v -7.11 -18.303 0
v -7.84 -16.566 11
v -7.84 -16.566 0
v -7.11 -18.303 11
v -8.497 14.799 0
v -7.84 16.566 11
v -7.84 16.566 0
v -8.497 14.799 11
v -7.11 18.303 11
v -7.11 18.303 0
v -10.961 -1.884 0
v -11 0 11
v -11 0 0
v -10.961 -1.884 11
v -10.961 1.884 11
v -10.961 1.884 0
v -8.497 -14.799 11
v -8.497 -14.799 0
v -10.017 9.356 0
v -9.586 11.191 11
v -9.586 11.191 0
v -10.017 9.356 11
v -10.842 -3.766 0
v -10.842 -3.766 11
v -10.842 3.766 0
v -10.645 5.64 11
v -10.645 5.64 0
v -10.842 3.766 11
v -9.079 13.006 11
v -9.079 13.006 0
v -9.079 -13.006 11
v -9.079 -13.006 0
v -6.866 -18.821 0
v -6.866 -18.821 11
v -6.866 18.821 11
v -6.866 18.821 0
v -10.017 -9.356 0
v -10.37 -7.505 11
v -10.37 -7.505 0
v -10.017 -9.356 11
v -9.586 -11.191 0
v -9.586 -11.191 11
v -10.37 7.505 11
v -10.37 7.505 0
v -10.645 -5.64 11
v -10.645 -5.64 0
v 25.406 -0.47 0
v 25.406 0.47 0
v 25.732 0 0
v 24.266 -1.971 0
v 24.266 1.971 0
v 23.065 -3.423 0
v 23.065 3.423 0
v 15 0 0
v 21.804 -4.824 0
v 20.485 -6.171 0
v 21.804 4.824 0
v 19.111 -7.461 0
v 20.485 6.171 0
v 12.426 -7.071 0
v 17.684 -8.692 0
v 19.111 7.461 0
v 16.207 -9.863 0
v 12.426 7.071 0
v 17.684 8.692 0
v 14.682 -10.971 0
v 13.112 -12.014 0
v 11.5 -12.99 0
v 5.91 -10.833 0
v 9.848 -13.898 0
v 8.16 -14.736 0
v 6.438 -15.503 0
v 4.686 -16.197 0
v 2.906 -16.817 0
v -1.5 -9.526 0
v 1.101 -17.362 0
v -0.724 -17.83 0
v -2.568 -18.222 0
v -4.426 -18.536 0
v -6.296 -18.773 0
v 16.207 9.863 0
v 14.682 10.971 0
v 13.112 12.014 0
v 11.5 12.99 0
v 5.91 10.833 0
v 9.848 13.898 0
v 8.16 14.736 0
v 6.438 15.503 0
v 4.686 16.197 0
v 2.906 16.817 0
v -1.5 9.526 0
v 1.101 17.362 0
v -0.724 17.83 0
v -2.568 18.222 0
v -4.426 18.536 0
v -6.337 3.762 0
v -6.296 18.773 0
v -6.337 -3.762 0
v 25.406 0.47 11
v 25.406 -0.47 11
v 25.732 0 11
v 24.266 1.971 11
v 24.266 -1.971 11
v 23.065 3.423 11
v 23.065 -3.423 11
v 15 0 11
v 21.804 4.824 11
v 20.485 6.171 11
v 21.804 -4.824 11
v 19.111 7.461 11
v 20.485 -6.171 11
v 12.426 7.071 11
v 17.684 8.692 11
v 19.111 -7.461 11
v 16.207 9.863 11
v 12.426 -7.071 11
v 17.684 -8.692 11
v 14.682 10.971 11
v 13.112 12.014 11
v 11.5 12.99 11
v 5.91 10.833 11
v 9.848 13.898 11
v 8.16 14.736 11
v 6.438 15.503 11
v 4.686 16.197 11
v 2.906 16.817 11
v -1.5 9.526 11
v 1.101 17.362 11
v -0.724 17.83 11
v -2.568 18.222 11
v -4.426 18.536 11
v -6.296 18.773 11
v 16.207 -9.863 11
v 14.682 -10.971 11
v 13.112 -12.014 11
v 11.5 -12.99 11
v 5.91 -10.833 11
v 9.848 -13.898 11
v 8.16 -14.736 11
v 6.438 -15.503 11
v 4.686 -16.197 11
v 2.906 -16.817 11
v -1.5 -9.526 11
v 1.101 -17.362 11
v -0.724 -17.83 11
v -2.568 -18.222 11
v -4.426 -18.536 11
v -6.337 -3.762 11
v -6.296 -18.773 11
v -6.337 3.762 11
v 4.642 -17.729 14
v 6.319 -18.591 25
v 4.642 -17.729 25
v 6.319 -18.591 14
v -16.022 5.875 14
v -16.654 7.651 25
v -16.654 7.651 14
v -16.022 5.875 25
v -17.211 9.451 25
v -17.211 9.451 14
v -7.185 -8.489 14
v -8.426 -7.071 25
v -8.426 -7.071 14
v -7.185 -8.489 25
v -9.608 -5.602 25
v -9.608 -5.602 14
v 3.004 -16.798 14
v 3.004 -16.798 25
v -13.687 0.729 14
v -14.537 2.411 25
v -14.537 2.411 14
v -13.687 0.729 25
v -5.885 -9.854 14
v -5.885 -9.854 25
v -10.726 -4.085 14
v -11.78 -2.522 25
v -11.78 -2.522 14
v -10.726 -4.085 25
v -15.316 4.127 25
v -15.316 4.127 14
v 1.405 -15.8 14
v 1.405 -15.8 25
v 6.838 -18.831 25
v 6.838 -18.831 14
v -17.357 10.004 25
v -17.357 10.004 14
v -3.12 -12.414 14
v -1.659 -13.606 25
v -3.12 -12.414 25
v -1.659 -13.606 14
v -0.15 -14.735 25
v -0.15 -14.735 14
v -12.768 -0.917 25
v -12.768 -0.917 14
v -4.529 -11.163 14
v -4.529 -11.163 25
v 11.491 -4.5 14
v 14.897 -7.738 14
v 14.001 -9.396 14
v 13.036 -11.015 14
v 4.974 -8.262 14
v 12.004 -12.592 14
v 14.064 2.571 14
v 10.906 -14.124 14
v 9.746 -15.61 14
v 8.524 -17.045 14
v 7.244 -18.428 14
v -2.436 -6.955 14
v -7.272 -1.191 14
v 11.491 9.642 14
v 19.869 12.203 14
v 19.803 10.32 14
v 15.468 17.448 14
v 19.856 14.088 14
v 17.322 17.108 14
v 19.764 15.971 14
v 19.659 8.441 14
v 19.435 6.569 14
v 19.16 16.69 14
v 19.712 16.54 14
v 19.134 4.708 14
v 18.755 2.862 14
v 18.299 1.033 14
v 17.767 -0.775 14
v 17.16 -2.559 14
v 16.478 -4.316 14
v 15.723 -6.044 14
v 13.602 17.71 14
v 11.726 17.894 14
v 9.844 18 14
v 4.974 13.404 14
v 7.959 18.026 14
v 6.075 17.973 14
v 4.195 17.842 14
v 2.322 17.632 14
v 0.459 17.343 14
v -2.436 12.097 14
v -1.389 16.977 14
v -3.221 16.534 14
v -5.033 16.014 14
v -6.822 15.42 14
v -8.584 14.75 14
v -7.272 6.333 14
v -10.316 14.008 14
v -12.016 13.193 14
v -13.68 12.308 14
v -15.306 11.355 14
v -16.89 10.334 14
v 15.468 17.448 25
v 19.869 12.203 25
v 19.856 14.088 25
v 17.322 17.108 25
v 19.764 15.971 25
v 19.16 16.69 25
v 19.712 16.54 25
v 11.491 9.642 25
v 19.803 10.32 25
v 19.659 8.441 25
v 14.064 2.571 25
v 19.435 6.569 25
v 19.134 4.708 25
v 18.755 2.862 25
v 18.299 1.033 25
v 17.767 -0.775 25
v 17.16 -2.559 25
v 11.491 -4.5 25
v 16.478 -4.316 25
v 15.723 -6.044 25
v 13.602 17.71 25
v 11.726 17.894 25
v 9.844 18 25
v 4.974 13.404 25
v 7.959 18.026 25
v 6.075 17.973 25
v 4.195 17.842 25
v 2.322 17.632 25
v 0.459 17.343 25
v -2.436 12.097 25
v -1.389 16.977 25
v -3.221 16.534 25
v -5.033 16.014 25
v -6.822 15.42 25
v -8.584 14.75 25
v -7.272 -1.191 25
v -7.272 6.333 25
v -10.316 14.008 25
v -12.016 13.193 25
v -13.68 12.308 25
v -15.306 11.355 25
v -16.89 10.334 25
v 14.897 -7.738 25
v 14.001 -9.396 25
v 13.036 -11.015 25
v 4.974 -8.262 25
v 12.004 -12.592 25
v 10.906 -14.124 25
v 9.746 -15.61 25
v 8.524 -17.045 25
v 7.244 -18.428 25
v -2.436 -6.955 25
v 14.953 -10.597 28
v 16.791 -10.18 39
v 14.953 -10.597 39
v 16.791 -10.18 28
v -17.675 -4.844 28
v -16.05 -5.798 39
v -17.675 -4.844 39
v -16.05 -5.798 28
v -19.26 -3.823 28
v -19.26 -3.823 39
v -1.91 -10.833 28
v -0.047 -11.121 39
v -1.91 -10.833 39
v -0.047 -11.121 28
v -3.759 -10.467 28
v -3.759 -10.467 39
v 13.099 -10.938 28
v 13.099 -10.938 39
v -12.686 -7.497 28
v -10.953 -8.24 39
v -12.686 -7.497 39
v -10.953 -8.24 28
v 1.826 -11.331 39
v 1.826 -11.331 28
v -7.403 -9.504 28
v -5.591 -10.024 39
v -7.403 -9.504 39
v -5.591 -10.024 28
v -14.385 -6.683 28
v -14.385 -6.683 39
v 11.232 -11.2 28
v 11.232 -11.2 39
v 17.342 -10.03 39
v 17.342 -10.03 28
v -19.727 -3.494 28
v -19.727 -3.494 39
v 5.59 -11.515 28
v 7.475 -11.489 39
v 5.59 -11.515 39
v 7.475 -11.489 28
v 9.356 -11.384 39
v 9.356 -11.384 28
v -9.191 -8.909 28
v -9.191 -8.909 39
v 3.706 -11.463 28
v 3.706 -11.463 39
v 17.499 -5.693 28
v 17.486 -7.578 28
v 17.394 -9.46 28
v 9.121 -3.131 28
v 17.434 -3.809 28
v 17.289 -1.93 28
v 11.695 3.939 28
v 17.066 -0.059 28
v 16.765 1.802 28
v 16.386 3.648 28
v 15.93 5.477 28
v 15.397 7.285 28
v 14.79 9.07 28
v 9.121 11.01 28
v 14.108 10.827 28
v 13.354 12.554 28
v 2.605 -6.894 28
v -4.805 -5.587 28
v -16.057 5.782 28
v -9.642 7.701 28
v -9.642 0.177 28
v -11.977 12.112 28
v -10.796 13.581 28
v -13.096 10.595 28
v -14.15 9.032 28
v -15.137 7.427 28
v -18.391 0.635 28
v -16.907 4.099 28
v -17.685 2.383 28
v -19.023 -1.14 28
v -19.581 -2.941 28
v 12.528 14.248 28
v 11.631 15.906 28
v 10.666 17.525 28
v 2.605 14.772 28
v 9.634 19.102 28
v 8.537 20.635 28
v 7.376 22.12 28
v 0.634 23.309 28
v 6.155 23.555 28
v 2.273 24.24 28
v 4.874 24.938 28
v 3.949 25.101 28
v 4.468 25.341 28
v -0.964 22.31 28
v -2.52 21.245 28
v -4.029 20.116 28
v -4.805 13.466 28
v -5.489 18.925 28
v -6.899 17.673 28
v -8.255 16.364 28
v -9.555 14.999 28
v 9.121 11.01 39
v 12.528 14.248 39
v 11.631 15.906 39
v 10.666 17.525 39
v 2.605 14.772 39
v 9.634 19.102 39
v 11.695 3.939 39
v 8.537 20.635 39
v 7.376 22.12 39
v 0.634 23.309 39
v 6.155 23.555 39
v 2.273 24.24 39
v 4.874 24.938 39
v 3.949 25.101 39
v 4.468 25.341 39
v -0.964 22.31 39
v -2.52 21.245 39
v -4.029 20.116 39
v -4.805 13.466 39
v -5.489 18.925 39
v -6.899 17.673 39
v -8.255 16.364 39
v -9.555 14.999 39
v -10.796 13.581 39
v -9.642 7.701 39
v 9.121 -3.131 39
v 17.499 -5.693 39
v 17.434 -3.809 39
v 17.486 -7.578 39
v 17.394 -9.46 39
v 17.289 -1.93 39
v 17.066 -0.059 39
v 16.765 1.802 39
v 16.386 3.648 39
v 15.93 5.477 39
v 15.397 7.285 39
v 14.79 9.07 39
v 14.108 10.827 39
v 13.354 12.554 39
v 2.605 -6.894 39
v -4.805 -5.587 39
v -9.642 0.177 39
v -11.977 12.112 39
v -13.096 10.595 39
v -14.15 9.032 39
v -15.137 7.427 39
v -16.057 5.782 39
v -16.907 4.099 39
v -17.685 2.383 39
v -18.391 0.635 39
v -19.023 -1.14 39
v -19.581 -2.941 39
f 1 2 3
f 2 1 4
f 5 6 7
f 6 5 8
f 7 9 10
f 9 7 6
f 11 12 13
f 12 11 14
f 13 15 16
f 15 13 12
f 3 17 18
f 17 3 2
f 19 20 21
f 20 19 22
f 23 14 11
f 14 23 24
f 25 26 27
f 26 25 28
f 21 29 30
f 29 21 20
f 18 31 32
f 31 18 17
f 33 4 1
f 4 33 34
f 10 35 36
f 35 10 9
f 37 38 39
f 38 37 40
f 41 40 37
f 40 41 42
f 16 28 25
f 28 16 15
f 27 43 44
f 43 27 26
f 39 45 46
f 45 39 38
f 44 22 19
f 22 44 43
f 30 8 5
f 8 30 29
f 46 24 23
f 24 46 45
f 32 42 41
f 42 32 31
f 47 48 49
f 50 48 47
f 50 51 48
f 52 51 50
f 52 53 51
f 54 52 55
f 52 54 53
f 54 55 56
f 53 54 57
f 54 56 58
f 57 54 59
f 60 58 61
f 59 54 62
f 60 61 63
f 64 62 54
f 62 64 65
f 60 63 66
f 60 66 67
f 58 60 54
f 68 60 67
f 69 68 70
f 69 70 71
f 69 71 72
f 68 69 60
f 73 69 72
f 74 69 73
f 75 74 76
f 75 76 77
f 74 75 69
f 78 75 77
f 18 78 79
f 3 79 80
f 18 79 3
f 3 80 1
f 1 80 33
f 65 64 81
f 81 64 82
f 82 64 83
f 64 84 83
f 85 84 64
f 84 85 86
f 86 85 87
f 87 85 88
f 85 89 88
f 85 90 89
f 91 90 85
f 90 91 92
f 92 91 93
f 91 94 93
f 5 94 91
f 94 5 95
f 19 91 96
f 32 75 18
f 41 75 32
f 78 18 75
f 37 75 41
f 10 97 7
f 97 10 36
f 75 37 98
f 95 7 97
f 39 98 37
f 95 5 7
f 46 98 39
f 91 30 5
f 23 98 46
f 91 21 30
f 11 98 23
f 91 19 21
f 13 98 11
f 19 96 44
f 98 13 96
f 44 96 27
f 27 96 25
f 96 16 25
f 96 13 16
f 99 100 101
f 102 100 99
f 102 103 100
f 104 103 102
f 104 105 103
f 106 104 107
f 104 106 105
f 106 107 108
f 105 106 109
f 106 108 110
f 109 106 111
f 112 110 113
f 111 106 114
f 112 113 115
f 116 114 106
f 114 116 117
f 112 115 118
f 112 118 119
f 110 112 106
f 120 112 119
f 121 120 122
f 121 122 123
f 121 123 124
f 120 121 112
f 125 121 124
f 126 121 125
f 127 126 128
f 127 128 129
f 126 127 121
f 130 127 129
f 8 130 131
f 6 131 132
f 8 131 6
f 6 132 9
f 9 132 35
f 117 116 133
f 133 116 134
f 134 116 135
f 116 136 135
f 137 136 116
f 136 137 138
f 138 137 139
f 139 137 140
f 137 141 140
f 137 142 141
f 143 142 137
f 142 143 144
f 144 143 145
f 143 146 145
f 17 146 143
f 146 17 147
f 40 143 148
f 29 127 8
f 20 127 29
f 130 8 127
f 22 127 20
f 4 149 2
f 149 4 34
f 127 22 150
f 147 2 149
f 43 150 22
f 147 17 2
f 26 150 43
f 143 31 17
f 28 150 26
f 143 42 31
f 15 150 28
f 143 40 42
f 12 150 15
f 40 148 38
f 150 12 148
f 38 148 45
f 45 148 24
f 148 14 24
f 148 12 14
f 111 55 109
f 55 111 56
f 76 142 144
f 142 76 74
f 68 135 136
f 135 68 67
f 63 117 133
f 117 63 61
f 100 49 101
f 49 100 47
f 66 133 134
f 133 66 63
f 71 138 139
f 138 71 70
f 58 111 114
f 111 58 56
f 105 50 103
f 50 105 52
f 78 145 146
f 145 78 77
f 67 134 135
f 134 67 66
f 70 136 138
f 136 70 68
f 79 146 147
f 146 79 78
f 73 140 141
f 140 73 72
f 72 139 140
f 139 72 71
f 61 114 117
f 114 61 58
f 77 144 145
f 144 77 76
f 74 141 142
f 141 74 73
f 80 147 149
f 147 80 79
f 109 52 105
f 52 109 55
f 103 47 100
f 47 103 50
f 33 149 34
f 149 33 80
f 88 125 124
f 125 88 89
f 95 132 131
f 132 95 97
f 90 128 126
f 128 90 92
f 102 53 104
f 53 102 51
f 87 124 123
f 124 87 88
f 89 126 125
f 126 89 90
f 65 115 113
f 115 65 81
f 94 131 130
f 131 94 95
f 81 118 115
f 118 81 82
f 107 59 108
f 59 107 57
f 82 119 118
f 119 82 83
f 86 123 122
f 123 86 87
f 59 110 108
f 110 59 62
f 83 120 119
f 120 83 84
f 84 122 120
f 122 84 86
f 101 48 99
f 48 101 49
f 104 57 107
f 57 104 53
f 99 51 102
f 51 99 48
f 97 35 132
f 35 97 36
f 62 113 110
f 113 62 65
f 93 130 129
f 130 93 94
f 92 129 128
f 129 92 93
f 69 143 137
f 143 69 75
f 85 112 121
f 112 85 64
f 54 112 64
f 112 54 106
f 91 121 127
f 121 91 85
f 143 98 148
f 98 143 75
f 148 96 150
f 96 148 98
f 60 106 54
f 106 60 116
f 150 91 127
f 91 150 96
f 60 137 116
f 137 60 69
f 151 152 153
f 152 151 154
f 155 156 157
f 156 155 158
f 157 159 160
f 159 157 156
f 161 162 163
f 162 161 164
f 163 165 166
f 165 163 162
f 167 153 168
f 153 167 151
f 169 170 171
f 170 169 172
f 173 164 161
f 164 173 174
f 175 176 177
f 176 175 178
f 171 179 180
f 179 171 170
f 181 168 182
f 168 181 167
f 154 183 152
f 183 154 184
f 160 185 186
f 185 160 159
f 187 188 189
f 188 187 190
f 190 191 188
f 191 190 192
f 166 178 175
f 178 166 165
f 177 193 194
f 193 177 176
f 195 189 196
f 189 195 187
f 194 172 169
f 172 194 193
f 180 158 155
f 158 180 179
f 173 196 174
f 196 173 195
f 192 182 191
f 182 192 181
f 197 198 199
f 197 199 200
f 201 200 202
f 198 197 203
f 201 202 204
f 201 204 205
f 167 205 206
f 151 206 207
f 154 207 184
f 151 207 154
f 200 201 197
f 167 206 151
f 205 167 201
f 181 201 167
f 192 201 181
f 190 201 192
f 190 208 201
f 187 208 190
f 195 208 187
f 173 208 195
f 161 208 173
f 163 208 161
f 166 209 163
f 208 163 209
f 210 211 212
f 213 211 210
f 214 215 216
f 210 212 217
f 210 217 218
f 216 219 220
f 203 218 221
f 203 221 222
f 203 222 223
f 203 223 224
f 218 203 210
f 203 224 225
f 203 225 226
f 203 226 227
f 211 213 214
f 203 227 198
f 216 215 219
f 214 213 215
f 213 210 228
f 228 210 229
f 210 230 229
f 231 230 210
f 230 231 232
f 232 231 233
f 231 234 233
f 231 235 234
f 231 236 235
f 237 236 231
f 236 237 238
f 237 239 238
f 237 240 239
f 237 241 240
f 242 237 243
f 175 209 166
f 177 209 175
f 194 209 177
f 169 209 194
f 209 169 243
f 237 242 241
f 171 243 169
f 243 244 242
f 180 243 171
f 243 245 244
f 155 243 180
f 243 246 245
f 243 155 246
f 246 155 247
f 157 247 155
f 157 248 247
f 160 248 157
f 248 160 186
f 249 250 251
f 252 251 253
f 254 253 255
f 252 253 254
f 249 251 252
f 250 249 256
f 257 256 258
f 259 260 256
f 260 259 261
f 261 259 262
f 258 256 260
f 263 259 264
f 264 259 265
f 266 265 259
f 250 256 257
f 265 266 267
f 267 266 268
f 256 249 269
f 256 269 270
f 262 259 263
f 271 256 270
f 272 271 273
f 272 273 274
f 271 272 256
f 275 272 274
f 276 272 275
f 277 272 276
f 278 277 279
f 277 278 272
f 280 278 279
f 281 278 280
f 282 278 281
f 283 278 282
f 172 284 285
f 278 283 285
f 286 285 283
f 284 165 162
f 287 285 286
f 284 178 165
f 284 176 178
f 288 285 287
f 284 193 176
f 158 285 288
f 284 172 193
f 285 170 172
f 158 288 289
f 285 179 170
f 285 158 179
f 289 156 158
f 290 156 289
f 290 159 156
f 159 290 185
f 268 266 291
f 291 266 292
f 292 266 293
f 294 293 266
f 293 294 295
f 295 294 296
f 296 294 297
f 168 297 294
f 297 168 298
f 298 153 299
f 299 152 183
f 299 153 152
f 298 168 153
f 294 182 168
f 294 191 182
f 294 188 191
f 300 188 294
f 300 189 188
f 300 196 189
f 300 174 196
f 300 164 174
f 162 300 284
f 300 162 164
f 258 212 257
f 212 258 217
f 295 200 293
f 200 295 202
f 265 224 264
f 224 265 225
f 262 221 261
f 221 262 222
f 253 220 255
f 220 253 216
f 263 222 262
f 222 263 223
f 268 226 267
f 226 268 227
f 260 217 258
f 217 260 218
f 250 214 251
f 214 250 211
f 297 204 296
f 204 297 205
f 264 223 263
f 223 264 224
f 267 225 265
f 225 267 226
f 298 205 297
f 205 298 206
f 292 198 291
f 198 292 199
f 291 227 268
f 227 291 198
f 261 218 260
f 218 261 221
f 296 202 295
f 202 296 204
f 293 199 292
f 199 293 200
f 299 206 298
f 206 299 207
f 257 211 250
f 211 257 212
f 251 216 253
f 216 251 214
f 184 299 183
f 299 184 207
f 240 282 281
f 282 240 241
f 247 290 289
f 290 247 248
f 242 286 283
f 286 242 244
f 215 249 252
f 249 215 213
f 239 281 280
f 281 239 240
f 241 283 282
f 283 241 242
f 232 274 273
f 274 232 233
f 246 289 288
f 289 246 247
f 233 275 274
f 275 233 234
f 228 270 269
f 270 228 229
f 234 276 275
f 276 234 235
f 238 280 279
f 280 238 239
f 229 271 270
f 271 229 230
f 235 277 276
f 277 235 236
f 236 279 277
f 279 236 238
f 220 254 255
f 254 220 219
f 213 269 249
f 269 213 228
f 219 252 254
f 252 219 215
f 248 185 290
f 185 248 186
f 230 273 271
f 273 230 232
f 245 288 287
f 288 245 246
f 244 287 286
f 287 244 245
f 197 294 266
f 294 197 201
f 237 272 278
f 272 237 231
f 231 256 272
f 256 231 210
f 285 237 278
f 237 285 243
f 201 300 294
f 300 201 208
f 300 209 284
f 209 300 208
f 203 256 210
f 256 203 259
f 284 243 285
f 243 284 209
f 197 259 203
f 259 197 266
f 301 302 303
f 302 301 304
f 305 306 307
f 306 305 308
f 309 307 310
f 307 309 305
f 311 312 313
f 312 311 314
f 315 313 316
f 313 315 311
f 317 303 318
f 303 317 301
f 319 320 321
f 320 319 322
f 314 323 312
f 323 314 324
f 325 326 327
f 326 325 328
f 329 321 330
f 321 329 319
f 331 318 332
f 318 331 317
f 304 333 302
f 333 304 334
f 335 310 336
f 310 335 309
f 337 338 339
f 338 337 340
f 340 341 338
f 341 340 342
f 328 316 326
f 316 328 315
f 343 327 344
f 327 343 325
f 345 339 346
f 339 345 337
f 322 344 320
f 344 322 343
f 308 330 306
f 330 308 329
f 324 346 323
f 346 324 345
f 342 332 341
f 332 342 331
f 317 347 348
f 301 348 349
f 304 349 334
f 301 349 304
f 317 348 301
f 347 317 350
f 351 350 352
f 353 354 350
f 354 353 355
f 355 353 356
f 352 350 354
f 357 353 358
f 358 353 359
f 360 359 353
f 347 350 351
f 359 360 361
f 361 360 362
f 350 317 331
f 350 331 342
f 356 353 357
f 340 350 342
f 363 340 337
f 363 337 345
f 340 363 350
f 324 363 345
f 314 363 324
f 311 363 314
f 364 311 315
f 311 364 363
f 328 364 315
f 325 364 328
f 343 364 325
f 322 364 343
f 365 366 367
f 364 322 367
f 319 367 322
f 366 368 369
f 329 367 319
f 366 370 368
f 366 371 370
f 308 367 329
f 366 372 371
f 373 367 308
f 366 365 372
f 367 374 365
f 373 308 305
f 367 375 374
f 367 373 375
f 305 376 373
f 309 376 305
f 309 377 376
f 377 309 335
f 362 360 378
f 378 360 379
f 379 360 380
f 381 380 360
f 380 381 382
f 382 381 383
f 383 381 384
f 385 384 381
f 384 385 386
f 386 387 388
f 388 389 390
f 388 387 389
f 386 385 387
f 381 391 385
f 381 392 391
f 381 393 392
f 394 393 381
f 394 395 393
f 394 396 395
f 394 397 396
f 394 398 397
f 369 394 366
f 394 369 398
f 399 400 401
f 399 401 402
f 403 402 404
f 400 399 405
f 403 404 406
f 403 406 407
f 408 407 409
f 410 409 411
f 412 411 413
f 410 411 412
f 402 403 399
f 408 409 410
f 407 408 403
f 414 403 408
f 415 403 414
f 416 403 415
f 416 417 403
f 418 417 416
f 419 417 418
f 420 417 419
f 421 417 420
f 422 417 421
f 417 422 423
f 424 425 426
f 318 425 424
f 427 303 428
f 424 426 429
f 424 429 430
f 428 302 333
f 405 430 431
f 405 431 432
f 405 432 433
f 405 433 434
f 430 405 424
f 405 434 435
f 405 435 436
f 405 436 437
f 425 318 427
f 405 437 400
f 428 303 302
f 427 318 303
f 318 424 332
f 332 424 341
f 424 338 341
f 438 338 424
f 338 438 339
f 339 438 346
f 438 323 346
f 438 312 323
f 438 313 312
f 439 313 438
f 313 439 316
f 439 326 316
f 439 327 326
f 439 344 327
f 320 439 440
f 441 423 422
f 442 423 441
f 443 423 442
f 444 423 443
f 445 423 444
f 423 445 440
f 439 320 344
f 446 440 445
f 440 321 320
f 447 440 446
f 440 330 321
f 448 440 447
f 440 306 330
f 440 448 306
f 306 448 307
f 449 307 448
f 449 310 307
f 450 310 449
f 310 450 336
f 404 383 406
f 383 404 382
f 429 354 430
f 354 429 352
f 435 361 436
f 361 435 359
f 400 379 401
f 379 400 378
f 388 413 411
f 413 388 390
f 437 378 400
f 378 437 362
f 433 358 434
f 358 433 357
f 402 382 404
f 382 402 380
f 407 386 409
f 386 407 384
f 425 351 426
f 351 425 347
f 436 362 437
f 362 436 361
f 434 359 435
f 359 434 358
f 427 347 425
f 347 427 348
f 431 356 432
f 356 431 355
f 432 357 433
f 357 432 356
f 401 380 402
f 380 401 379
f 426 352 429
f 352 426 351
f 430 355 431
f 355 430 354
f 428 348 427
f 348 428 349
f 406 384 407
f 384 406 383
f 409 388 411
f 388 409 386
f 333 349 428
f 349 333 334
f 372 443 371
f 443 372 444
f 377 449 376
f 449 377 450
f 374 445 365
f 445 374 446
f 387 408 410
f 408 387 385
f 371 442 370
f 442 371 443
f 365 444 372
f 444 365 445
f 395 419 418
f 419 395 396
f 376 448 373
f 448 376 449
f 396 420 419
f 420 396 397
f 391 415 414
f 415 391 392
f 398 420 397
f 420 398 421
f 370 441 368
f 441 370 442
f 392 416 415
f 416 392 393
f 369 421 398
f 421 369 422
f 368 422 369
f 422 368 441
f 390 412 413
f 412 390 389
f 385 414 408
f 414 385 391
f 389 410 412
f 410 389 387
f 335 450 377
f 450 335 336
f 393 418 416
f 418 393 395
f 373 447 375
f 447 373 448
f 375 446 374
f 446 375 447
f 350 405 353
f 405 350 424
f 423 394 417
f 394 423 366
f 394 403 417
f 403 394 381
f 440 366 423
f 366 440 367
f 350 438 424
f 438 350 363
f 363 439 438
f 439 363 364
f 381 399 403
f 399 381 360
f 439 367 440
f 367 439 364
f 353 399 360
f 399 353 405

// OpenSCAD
// file: myshapes.scad
 /*
  * Copyright [2017] [Saul Castro]

    Licensed under the Apache License, Version 2.0 (the "License");
    you may not use this file except in compliance with the License.
    You may obtain a copy of the License at
    
        http://www.apache.org/licenses/LICENSE-2.0
    
    Unless required by applicable law or agreed to in writing, software
    distributed under the License is distributed on an "AS IS" BASIS,
    WITHOUT WARRANTIES OR CONDITIONS OF ANY KIND, either express or implied.
    See the License for the specific language governing permissions and
    limitations under the License.

  */
  
  
/*==================================================
==================	Extention of basic shape with shot sintax =====================
==================================================*/
//all shapes centered at 0, 0 for easy rotation

// r prefix rounded
//rrc(10, 20 ,30, 4, 5);
//sp(11, 44);

fn = 50;

module c(w, l, d){
    translate([0,0,0]) cube([w, l, d], center=true);
}

module cy(d, h){  
    translate([0,0,0])    cylinder(d=d, h=h, $fn=fn, center=true);
}
module cy(d, h, f){  
    translate([0,0,0])    cylinder(d=d, h=h, $fn=f, center=true);
}

module sp(d, f){  
    translate([0,0,0])    sphere(d=d, $fn=f);
}

module rcy(d, h, c, fn){
	minkowski(){
			sp(c);
			cy(d-c, h-c, fn);
        }
}

module rc(w, l, d, c){
    hull(){
            translate([w/2-c/2,l/2-c/2,0]) cy(c, d);
            translate([w/2-c/2,-l/2+c/2,0]) cy(c, d);
            translate([-(w/2-c/2),l/2-c/2,0]) cy(c, d);
            translate([-(w/2-c/2),-l/2+c/2,0]) cy(c, d);
    }
    
}

module rrc(w, h, d, c, s){
          translate([0,0,0])  minkowski(){
			sp(s);
			rc(w-s, h-s, d-s, c);
        }
}



module slot(d, h, l){
    hull(){
        holes(d, h, l);
    } 
}

module cn(d, d2, h ,h2  , ff = fn ){ 
         rotate([0,0,90])  hull(){ 
                 translate([ 0, 0, h/2])   cy(d2, h, ff);  
                 translate([ 0, 0, h2/2])  cy(d, h2, ff); 
          }
}
                   

  
module cs(d, d2, h, x ){
    
                  for(i=[-1,1])  translate([ i*x/2, 0, 0])  cn(d, d2, h/3, h);
}

module holes(d, h, x, ff = fn){
    
                  for(i=[-1,1])  translate([ i*x/2, 0, h/2])  rotate([0,0,90]) cy(d, h, ff); 
}
                   
  
// main file
use <myshapes.scad>


fn = 150;

id = 30;
w = 2;
 h = 60;
 vs = 18;
 
     v = 3;
     h3 = 188;
 ro = 90;
 rh = 11;
 
 
// v3();
// vv3();
 
// !dr();
// head();
 
// vl();
// #vv();
      rotate([0,0,$t*720]) 
wan();

 module wan(){
     union(){
         for(i=[0:2]) translate([0,0,i*(rh+3)]) rotate([0,0,i*40]) rtr();
     }
 }

 module rtr(){ 
     translate([4,0,0])
     difference(){
     intersection_for(i=[0:2]) rotate([0,0,i*120]) 
         translate([ro/3, 0, rh/2]) cy(ro, rh, fn);
     translate([0,0,4]) cy(rh*2, rh*2, 9); 
     }
         
 }
     
 
 
 module dr(){
     difference(){
     translate([0,0,4]) cy(9.4, 8, 6);
     translate([0,0,8]) cy(6.4, 8, 6);
         
     }
 }
 
 module head(){
 for(i=[-1,1]) translate([0, i*id, 0]) rotate([0,0,i* 45]) {
     rotate([0,0,i*$t* 540+(i>0?-90:0)])
 vl();
 vv();
 }
 }
 
 module vv(){
     difference(){
         union(){
     translate([0,0,h+4]) cy(15, 9, 6);
     translate([0,0,h/2]) cy(id+w+.8, h, fn);
         }
     translate([0,0,-1.2]) cn(id+.8, id-2, h, h-2, fn);
          for(i=[0:2]) rotate([0, 0, 0]) translate([0,0,i*vs+vs/2+1.5]) rotate([90, 0]) hull(){
              cy(14.5, id*2, fn);
             translate([0,0,-id]) rotate([0, 0, 90]) slot(9, id*2, 7);
          }
     }
 }
 
 
 module vl(){
     difference(){
         union(){
     translate([0,0,h/2-1.2]) cn(id, id-2, h/2, h/2-2, fn);
     translate([0,0,h-4])  mirror([0, 0, 1]) cn(id, id-2, h-4, h-4-2, fn);
//     translate([0,0,54/2]) cy(id, 54, fn);
     translate([0,0,h+3]) cy(15, 8, 6);
         }
         
          for(i=[0:2]) rotate([0, 0, i*120]) translate([0,id/2,i*vs+vs/2+1.5]) rotate([90, 0]) vcc();
     }
 }
 
 
 module vcc(){
     difference(){
  #   translate([0,0,id/2]) cy(10, id+11, fn);
//         vc();
     }
 }
 module vc(){
     rotate_extrude(angle=360, convexity = 2)
     projection()
     translate([5, 0,0]) 
     hull(){
     translate([5,5,0]) cy(10, 1, fn);
     translate([5,id-5,0]) cy(10, 1, fn);
//     translate([5,40,0]) c(10, 1, 1);
     }
     
 }
 
 
 
 
 module vv3(){
     difference(){
     translate([0,0,h3/2]) cy(id+w+.8, h3, fn);
     translate([0,0,55/2+1.2]) cy(id+.8, 55, fn);
          for(j=[0:2])  for(i=[0:v-1]) rotate([0, 0, 0]) translate([0,0,i*17+9+j*21*v]) rotate([90, 0]) cy(14.5, id*2, fn);
     }
 }
 module v3(){
     difference(){
     translate([0,0,h3/2]) cy(id, h3, fn);
     translate([0,0,54-2]) cy(9.4, 4.2, 6);
         
        for(j=[0:2])  for(i=[0:v-1]) rotate([0, 0, j*120]) translate([0,id/2,i*17+9+j*21*v]) rotate([90, 0]) vcc();
     }
 }
 
 
 
